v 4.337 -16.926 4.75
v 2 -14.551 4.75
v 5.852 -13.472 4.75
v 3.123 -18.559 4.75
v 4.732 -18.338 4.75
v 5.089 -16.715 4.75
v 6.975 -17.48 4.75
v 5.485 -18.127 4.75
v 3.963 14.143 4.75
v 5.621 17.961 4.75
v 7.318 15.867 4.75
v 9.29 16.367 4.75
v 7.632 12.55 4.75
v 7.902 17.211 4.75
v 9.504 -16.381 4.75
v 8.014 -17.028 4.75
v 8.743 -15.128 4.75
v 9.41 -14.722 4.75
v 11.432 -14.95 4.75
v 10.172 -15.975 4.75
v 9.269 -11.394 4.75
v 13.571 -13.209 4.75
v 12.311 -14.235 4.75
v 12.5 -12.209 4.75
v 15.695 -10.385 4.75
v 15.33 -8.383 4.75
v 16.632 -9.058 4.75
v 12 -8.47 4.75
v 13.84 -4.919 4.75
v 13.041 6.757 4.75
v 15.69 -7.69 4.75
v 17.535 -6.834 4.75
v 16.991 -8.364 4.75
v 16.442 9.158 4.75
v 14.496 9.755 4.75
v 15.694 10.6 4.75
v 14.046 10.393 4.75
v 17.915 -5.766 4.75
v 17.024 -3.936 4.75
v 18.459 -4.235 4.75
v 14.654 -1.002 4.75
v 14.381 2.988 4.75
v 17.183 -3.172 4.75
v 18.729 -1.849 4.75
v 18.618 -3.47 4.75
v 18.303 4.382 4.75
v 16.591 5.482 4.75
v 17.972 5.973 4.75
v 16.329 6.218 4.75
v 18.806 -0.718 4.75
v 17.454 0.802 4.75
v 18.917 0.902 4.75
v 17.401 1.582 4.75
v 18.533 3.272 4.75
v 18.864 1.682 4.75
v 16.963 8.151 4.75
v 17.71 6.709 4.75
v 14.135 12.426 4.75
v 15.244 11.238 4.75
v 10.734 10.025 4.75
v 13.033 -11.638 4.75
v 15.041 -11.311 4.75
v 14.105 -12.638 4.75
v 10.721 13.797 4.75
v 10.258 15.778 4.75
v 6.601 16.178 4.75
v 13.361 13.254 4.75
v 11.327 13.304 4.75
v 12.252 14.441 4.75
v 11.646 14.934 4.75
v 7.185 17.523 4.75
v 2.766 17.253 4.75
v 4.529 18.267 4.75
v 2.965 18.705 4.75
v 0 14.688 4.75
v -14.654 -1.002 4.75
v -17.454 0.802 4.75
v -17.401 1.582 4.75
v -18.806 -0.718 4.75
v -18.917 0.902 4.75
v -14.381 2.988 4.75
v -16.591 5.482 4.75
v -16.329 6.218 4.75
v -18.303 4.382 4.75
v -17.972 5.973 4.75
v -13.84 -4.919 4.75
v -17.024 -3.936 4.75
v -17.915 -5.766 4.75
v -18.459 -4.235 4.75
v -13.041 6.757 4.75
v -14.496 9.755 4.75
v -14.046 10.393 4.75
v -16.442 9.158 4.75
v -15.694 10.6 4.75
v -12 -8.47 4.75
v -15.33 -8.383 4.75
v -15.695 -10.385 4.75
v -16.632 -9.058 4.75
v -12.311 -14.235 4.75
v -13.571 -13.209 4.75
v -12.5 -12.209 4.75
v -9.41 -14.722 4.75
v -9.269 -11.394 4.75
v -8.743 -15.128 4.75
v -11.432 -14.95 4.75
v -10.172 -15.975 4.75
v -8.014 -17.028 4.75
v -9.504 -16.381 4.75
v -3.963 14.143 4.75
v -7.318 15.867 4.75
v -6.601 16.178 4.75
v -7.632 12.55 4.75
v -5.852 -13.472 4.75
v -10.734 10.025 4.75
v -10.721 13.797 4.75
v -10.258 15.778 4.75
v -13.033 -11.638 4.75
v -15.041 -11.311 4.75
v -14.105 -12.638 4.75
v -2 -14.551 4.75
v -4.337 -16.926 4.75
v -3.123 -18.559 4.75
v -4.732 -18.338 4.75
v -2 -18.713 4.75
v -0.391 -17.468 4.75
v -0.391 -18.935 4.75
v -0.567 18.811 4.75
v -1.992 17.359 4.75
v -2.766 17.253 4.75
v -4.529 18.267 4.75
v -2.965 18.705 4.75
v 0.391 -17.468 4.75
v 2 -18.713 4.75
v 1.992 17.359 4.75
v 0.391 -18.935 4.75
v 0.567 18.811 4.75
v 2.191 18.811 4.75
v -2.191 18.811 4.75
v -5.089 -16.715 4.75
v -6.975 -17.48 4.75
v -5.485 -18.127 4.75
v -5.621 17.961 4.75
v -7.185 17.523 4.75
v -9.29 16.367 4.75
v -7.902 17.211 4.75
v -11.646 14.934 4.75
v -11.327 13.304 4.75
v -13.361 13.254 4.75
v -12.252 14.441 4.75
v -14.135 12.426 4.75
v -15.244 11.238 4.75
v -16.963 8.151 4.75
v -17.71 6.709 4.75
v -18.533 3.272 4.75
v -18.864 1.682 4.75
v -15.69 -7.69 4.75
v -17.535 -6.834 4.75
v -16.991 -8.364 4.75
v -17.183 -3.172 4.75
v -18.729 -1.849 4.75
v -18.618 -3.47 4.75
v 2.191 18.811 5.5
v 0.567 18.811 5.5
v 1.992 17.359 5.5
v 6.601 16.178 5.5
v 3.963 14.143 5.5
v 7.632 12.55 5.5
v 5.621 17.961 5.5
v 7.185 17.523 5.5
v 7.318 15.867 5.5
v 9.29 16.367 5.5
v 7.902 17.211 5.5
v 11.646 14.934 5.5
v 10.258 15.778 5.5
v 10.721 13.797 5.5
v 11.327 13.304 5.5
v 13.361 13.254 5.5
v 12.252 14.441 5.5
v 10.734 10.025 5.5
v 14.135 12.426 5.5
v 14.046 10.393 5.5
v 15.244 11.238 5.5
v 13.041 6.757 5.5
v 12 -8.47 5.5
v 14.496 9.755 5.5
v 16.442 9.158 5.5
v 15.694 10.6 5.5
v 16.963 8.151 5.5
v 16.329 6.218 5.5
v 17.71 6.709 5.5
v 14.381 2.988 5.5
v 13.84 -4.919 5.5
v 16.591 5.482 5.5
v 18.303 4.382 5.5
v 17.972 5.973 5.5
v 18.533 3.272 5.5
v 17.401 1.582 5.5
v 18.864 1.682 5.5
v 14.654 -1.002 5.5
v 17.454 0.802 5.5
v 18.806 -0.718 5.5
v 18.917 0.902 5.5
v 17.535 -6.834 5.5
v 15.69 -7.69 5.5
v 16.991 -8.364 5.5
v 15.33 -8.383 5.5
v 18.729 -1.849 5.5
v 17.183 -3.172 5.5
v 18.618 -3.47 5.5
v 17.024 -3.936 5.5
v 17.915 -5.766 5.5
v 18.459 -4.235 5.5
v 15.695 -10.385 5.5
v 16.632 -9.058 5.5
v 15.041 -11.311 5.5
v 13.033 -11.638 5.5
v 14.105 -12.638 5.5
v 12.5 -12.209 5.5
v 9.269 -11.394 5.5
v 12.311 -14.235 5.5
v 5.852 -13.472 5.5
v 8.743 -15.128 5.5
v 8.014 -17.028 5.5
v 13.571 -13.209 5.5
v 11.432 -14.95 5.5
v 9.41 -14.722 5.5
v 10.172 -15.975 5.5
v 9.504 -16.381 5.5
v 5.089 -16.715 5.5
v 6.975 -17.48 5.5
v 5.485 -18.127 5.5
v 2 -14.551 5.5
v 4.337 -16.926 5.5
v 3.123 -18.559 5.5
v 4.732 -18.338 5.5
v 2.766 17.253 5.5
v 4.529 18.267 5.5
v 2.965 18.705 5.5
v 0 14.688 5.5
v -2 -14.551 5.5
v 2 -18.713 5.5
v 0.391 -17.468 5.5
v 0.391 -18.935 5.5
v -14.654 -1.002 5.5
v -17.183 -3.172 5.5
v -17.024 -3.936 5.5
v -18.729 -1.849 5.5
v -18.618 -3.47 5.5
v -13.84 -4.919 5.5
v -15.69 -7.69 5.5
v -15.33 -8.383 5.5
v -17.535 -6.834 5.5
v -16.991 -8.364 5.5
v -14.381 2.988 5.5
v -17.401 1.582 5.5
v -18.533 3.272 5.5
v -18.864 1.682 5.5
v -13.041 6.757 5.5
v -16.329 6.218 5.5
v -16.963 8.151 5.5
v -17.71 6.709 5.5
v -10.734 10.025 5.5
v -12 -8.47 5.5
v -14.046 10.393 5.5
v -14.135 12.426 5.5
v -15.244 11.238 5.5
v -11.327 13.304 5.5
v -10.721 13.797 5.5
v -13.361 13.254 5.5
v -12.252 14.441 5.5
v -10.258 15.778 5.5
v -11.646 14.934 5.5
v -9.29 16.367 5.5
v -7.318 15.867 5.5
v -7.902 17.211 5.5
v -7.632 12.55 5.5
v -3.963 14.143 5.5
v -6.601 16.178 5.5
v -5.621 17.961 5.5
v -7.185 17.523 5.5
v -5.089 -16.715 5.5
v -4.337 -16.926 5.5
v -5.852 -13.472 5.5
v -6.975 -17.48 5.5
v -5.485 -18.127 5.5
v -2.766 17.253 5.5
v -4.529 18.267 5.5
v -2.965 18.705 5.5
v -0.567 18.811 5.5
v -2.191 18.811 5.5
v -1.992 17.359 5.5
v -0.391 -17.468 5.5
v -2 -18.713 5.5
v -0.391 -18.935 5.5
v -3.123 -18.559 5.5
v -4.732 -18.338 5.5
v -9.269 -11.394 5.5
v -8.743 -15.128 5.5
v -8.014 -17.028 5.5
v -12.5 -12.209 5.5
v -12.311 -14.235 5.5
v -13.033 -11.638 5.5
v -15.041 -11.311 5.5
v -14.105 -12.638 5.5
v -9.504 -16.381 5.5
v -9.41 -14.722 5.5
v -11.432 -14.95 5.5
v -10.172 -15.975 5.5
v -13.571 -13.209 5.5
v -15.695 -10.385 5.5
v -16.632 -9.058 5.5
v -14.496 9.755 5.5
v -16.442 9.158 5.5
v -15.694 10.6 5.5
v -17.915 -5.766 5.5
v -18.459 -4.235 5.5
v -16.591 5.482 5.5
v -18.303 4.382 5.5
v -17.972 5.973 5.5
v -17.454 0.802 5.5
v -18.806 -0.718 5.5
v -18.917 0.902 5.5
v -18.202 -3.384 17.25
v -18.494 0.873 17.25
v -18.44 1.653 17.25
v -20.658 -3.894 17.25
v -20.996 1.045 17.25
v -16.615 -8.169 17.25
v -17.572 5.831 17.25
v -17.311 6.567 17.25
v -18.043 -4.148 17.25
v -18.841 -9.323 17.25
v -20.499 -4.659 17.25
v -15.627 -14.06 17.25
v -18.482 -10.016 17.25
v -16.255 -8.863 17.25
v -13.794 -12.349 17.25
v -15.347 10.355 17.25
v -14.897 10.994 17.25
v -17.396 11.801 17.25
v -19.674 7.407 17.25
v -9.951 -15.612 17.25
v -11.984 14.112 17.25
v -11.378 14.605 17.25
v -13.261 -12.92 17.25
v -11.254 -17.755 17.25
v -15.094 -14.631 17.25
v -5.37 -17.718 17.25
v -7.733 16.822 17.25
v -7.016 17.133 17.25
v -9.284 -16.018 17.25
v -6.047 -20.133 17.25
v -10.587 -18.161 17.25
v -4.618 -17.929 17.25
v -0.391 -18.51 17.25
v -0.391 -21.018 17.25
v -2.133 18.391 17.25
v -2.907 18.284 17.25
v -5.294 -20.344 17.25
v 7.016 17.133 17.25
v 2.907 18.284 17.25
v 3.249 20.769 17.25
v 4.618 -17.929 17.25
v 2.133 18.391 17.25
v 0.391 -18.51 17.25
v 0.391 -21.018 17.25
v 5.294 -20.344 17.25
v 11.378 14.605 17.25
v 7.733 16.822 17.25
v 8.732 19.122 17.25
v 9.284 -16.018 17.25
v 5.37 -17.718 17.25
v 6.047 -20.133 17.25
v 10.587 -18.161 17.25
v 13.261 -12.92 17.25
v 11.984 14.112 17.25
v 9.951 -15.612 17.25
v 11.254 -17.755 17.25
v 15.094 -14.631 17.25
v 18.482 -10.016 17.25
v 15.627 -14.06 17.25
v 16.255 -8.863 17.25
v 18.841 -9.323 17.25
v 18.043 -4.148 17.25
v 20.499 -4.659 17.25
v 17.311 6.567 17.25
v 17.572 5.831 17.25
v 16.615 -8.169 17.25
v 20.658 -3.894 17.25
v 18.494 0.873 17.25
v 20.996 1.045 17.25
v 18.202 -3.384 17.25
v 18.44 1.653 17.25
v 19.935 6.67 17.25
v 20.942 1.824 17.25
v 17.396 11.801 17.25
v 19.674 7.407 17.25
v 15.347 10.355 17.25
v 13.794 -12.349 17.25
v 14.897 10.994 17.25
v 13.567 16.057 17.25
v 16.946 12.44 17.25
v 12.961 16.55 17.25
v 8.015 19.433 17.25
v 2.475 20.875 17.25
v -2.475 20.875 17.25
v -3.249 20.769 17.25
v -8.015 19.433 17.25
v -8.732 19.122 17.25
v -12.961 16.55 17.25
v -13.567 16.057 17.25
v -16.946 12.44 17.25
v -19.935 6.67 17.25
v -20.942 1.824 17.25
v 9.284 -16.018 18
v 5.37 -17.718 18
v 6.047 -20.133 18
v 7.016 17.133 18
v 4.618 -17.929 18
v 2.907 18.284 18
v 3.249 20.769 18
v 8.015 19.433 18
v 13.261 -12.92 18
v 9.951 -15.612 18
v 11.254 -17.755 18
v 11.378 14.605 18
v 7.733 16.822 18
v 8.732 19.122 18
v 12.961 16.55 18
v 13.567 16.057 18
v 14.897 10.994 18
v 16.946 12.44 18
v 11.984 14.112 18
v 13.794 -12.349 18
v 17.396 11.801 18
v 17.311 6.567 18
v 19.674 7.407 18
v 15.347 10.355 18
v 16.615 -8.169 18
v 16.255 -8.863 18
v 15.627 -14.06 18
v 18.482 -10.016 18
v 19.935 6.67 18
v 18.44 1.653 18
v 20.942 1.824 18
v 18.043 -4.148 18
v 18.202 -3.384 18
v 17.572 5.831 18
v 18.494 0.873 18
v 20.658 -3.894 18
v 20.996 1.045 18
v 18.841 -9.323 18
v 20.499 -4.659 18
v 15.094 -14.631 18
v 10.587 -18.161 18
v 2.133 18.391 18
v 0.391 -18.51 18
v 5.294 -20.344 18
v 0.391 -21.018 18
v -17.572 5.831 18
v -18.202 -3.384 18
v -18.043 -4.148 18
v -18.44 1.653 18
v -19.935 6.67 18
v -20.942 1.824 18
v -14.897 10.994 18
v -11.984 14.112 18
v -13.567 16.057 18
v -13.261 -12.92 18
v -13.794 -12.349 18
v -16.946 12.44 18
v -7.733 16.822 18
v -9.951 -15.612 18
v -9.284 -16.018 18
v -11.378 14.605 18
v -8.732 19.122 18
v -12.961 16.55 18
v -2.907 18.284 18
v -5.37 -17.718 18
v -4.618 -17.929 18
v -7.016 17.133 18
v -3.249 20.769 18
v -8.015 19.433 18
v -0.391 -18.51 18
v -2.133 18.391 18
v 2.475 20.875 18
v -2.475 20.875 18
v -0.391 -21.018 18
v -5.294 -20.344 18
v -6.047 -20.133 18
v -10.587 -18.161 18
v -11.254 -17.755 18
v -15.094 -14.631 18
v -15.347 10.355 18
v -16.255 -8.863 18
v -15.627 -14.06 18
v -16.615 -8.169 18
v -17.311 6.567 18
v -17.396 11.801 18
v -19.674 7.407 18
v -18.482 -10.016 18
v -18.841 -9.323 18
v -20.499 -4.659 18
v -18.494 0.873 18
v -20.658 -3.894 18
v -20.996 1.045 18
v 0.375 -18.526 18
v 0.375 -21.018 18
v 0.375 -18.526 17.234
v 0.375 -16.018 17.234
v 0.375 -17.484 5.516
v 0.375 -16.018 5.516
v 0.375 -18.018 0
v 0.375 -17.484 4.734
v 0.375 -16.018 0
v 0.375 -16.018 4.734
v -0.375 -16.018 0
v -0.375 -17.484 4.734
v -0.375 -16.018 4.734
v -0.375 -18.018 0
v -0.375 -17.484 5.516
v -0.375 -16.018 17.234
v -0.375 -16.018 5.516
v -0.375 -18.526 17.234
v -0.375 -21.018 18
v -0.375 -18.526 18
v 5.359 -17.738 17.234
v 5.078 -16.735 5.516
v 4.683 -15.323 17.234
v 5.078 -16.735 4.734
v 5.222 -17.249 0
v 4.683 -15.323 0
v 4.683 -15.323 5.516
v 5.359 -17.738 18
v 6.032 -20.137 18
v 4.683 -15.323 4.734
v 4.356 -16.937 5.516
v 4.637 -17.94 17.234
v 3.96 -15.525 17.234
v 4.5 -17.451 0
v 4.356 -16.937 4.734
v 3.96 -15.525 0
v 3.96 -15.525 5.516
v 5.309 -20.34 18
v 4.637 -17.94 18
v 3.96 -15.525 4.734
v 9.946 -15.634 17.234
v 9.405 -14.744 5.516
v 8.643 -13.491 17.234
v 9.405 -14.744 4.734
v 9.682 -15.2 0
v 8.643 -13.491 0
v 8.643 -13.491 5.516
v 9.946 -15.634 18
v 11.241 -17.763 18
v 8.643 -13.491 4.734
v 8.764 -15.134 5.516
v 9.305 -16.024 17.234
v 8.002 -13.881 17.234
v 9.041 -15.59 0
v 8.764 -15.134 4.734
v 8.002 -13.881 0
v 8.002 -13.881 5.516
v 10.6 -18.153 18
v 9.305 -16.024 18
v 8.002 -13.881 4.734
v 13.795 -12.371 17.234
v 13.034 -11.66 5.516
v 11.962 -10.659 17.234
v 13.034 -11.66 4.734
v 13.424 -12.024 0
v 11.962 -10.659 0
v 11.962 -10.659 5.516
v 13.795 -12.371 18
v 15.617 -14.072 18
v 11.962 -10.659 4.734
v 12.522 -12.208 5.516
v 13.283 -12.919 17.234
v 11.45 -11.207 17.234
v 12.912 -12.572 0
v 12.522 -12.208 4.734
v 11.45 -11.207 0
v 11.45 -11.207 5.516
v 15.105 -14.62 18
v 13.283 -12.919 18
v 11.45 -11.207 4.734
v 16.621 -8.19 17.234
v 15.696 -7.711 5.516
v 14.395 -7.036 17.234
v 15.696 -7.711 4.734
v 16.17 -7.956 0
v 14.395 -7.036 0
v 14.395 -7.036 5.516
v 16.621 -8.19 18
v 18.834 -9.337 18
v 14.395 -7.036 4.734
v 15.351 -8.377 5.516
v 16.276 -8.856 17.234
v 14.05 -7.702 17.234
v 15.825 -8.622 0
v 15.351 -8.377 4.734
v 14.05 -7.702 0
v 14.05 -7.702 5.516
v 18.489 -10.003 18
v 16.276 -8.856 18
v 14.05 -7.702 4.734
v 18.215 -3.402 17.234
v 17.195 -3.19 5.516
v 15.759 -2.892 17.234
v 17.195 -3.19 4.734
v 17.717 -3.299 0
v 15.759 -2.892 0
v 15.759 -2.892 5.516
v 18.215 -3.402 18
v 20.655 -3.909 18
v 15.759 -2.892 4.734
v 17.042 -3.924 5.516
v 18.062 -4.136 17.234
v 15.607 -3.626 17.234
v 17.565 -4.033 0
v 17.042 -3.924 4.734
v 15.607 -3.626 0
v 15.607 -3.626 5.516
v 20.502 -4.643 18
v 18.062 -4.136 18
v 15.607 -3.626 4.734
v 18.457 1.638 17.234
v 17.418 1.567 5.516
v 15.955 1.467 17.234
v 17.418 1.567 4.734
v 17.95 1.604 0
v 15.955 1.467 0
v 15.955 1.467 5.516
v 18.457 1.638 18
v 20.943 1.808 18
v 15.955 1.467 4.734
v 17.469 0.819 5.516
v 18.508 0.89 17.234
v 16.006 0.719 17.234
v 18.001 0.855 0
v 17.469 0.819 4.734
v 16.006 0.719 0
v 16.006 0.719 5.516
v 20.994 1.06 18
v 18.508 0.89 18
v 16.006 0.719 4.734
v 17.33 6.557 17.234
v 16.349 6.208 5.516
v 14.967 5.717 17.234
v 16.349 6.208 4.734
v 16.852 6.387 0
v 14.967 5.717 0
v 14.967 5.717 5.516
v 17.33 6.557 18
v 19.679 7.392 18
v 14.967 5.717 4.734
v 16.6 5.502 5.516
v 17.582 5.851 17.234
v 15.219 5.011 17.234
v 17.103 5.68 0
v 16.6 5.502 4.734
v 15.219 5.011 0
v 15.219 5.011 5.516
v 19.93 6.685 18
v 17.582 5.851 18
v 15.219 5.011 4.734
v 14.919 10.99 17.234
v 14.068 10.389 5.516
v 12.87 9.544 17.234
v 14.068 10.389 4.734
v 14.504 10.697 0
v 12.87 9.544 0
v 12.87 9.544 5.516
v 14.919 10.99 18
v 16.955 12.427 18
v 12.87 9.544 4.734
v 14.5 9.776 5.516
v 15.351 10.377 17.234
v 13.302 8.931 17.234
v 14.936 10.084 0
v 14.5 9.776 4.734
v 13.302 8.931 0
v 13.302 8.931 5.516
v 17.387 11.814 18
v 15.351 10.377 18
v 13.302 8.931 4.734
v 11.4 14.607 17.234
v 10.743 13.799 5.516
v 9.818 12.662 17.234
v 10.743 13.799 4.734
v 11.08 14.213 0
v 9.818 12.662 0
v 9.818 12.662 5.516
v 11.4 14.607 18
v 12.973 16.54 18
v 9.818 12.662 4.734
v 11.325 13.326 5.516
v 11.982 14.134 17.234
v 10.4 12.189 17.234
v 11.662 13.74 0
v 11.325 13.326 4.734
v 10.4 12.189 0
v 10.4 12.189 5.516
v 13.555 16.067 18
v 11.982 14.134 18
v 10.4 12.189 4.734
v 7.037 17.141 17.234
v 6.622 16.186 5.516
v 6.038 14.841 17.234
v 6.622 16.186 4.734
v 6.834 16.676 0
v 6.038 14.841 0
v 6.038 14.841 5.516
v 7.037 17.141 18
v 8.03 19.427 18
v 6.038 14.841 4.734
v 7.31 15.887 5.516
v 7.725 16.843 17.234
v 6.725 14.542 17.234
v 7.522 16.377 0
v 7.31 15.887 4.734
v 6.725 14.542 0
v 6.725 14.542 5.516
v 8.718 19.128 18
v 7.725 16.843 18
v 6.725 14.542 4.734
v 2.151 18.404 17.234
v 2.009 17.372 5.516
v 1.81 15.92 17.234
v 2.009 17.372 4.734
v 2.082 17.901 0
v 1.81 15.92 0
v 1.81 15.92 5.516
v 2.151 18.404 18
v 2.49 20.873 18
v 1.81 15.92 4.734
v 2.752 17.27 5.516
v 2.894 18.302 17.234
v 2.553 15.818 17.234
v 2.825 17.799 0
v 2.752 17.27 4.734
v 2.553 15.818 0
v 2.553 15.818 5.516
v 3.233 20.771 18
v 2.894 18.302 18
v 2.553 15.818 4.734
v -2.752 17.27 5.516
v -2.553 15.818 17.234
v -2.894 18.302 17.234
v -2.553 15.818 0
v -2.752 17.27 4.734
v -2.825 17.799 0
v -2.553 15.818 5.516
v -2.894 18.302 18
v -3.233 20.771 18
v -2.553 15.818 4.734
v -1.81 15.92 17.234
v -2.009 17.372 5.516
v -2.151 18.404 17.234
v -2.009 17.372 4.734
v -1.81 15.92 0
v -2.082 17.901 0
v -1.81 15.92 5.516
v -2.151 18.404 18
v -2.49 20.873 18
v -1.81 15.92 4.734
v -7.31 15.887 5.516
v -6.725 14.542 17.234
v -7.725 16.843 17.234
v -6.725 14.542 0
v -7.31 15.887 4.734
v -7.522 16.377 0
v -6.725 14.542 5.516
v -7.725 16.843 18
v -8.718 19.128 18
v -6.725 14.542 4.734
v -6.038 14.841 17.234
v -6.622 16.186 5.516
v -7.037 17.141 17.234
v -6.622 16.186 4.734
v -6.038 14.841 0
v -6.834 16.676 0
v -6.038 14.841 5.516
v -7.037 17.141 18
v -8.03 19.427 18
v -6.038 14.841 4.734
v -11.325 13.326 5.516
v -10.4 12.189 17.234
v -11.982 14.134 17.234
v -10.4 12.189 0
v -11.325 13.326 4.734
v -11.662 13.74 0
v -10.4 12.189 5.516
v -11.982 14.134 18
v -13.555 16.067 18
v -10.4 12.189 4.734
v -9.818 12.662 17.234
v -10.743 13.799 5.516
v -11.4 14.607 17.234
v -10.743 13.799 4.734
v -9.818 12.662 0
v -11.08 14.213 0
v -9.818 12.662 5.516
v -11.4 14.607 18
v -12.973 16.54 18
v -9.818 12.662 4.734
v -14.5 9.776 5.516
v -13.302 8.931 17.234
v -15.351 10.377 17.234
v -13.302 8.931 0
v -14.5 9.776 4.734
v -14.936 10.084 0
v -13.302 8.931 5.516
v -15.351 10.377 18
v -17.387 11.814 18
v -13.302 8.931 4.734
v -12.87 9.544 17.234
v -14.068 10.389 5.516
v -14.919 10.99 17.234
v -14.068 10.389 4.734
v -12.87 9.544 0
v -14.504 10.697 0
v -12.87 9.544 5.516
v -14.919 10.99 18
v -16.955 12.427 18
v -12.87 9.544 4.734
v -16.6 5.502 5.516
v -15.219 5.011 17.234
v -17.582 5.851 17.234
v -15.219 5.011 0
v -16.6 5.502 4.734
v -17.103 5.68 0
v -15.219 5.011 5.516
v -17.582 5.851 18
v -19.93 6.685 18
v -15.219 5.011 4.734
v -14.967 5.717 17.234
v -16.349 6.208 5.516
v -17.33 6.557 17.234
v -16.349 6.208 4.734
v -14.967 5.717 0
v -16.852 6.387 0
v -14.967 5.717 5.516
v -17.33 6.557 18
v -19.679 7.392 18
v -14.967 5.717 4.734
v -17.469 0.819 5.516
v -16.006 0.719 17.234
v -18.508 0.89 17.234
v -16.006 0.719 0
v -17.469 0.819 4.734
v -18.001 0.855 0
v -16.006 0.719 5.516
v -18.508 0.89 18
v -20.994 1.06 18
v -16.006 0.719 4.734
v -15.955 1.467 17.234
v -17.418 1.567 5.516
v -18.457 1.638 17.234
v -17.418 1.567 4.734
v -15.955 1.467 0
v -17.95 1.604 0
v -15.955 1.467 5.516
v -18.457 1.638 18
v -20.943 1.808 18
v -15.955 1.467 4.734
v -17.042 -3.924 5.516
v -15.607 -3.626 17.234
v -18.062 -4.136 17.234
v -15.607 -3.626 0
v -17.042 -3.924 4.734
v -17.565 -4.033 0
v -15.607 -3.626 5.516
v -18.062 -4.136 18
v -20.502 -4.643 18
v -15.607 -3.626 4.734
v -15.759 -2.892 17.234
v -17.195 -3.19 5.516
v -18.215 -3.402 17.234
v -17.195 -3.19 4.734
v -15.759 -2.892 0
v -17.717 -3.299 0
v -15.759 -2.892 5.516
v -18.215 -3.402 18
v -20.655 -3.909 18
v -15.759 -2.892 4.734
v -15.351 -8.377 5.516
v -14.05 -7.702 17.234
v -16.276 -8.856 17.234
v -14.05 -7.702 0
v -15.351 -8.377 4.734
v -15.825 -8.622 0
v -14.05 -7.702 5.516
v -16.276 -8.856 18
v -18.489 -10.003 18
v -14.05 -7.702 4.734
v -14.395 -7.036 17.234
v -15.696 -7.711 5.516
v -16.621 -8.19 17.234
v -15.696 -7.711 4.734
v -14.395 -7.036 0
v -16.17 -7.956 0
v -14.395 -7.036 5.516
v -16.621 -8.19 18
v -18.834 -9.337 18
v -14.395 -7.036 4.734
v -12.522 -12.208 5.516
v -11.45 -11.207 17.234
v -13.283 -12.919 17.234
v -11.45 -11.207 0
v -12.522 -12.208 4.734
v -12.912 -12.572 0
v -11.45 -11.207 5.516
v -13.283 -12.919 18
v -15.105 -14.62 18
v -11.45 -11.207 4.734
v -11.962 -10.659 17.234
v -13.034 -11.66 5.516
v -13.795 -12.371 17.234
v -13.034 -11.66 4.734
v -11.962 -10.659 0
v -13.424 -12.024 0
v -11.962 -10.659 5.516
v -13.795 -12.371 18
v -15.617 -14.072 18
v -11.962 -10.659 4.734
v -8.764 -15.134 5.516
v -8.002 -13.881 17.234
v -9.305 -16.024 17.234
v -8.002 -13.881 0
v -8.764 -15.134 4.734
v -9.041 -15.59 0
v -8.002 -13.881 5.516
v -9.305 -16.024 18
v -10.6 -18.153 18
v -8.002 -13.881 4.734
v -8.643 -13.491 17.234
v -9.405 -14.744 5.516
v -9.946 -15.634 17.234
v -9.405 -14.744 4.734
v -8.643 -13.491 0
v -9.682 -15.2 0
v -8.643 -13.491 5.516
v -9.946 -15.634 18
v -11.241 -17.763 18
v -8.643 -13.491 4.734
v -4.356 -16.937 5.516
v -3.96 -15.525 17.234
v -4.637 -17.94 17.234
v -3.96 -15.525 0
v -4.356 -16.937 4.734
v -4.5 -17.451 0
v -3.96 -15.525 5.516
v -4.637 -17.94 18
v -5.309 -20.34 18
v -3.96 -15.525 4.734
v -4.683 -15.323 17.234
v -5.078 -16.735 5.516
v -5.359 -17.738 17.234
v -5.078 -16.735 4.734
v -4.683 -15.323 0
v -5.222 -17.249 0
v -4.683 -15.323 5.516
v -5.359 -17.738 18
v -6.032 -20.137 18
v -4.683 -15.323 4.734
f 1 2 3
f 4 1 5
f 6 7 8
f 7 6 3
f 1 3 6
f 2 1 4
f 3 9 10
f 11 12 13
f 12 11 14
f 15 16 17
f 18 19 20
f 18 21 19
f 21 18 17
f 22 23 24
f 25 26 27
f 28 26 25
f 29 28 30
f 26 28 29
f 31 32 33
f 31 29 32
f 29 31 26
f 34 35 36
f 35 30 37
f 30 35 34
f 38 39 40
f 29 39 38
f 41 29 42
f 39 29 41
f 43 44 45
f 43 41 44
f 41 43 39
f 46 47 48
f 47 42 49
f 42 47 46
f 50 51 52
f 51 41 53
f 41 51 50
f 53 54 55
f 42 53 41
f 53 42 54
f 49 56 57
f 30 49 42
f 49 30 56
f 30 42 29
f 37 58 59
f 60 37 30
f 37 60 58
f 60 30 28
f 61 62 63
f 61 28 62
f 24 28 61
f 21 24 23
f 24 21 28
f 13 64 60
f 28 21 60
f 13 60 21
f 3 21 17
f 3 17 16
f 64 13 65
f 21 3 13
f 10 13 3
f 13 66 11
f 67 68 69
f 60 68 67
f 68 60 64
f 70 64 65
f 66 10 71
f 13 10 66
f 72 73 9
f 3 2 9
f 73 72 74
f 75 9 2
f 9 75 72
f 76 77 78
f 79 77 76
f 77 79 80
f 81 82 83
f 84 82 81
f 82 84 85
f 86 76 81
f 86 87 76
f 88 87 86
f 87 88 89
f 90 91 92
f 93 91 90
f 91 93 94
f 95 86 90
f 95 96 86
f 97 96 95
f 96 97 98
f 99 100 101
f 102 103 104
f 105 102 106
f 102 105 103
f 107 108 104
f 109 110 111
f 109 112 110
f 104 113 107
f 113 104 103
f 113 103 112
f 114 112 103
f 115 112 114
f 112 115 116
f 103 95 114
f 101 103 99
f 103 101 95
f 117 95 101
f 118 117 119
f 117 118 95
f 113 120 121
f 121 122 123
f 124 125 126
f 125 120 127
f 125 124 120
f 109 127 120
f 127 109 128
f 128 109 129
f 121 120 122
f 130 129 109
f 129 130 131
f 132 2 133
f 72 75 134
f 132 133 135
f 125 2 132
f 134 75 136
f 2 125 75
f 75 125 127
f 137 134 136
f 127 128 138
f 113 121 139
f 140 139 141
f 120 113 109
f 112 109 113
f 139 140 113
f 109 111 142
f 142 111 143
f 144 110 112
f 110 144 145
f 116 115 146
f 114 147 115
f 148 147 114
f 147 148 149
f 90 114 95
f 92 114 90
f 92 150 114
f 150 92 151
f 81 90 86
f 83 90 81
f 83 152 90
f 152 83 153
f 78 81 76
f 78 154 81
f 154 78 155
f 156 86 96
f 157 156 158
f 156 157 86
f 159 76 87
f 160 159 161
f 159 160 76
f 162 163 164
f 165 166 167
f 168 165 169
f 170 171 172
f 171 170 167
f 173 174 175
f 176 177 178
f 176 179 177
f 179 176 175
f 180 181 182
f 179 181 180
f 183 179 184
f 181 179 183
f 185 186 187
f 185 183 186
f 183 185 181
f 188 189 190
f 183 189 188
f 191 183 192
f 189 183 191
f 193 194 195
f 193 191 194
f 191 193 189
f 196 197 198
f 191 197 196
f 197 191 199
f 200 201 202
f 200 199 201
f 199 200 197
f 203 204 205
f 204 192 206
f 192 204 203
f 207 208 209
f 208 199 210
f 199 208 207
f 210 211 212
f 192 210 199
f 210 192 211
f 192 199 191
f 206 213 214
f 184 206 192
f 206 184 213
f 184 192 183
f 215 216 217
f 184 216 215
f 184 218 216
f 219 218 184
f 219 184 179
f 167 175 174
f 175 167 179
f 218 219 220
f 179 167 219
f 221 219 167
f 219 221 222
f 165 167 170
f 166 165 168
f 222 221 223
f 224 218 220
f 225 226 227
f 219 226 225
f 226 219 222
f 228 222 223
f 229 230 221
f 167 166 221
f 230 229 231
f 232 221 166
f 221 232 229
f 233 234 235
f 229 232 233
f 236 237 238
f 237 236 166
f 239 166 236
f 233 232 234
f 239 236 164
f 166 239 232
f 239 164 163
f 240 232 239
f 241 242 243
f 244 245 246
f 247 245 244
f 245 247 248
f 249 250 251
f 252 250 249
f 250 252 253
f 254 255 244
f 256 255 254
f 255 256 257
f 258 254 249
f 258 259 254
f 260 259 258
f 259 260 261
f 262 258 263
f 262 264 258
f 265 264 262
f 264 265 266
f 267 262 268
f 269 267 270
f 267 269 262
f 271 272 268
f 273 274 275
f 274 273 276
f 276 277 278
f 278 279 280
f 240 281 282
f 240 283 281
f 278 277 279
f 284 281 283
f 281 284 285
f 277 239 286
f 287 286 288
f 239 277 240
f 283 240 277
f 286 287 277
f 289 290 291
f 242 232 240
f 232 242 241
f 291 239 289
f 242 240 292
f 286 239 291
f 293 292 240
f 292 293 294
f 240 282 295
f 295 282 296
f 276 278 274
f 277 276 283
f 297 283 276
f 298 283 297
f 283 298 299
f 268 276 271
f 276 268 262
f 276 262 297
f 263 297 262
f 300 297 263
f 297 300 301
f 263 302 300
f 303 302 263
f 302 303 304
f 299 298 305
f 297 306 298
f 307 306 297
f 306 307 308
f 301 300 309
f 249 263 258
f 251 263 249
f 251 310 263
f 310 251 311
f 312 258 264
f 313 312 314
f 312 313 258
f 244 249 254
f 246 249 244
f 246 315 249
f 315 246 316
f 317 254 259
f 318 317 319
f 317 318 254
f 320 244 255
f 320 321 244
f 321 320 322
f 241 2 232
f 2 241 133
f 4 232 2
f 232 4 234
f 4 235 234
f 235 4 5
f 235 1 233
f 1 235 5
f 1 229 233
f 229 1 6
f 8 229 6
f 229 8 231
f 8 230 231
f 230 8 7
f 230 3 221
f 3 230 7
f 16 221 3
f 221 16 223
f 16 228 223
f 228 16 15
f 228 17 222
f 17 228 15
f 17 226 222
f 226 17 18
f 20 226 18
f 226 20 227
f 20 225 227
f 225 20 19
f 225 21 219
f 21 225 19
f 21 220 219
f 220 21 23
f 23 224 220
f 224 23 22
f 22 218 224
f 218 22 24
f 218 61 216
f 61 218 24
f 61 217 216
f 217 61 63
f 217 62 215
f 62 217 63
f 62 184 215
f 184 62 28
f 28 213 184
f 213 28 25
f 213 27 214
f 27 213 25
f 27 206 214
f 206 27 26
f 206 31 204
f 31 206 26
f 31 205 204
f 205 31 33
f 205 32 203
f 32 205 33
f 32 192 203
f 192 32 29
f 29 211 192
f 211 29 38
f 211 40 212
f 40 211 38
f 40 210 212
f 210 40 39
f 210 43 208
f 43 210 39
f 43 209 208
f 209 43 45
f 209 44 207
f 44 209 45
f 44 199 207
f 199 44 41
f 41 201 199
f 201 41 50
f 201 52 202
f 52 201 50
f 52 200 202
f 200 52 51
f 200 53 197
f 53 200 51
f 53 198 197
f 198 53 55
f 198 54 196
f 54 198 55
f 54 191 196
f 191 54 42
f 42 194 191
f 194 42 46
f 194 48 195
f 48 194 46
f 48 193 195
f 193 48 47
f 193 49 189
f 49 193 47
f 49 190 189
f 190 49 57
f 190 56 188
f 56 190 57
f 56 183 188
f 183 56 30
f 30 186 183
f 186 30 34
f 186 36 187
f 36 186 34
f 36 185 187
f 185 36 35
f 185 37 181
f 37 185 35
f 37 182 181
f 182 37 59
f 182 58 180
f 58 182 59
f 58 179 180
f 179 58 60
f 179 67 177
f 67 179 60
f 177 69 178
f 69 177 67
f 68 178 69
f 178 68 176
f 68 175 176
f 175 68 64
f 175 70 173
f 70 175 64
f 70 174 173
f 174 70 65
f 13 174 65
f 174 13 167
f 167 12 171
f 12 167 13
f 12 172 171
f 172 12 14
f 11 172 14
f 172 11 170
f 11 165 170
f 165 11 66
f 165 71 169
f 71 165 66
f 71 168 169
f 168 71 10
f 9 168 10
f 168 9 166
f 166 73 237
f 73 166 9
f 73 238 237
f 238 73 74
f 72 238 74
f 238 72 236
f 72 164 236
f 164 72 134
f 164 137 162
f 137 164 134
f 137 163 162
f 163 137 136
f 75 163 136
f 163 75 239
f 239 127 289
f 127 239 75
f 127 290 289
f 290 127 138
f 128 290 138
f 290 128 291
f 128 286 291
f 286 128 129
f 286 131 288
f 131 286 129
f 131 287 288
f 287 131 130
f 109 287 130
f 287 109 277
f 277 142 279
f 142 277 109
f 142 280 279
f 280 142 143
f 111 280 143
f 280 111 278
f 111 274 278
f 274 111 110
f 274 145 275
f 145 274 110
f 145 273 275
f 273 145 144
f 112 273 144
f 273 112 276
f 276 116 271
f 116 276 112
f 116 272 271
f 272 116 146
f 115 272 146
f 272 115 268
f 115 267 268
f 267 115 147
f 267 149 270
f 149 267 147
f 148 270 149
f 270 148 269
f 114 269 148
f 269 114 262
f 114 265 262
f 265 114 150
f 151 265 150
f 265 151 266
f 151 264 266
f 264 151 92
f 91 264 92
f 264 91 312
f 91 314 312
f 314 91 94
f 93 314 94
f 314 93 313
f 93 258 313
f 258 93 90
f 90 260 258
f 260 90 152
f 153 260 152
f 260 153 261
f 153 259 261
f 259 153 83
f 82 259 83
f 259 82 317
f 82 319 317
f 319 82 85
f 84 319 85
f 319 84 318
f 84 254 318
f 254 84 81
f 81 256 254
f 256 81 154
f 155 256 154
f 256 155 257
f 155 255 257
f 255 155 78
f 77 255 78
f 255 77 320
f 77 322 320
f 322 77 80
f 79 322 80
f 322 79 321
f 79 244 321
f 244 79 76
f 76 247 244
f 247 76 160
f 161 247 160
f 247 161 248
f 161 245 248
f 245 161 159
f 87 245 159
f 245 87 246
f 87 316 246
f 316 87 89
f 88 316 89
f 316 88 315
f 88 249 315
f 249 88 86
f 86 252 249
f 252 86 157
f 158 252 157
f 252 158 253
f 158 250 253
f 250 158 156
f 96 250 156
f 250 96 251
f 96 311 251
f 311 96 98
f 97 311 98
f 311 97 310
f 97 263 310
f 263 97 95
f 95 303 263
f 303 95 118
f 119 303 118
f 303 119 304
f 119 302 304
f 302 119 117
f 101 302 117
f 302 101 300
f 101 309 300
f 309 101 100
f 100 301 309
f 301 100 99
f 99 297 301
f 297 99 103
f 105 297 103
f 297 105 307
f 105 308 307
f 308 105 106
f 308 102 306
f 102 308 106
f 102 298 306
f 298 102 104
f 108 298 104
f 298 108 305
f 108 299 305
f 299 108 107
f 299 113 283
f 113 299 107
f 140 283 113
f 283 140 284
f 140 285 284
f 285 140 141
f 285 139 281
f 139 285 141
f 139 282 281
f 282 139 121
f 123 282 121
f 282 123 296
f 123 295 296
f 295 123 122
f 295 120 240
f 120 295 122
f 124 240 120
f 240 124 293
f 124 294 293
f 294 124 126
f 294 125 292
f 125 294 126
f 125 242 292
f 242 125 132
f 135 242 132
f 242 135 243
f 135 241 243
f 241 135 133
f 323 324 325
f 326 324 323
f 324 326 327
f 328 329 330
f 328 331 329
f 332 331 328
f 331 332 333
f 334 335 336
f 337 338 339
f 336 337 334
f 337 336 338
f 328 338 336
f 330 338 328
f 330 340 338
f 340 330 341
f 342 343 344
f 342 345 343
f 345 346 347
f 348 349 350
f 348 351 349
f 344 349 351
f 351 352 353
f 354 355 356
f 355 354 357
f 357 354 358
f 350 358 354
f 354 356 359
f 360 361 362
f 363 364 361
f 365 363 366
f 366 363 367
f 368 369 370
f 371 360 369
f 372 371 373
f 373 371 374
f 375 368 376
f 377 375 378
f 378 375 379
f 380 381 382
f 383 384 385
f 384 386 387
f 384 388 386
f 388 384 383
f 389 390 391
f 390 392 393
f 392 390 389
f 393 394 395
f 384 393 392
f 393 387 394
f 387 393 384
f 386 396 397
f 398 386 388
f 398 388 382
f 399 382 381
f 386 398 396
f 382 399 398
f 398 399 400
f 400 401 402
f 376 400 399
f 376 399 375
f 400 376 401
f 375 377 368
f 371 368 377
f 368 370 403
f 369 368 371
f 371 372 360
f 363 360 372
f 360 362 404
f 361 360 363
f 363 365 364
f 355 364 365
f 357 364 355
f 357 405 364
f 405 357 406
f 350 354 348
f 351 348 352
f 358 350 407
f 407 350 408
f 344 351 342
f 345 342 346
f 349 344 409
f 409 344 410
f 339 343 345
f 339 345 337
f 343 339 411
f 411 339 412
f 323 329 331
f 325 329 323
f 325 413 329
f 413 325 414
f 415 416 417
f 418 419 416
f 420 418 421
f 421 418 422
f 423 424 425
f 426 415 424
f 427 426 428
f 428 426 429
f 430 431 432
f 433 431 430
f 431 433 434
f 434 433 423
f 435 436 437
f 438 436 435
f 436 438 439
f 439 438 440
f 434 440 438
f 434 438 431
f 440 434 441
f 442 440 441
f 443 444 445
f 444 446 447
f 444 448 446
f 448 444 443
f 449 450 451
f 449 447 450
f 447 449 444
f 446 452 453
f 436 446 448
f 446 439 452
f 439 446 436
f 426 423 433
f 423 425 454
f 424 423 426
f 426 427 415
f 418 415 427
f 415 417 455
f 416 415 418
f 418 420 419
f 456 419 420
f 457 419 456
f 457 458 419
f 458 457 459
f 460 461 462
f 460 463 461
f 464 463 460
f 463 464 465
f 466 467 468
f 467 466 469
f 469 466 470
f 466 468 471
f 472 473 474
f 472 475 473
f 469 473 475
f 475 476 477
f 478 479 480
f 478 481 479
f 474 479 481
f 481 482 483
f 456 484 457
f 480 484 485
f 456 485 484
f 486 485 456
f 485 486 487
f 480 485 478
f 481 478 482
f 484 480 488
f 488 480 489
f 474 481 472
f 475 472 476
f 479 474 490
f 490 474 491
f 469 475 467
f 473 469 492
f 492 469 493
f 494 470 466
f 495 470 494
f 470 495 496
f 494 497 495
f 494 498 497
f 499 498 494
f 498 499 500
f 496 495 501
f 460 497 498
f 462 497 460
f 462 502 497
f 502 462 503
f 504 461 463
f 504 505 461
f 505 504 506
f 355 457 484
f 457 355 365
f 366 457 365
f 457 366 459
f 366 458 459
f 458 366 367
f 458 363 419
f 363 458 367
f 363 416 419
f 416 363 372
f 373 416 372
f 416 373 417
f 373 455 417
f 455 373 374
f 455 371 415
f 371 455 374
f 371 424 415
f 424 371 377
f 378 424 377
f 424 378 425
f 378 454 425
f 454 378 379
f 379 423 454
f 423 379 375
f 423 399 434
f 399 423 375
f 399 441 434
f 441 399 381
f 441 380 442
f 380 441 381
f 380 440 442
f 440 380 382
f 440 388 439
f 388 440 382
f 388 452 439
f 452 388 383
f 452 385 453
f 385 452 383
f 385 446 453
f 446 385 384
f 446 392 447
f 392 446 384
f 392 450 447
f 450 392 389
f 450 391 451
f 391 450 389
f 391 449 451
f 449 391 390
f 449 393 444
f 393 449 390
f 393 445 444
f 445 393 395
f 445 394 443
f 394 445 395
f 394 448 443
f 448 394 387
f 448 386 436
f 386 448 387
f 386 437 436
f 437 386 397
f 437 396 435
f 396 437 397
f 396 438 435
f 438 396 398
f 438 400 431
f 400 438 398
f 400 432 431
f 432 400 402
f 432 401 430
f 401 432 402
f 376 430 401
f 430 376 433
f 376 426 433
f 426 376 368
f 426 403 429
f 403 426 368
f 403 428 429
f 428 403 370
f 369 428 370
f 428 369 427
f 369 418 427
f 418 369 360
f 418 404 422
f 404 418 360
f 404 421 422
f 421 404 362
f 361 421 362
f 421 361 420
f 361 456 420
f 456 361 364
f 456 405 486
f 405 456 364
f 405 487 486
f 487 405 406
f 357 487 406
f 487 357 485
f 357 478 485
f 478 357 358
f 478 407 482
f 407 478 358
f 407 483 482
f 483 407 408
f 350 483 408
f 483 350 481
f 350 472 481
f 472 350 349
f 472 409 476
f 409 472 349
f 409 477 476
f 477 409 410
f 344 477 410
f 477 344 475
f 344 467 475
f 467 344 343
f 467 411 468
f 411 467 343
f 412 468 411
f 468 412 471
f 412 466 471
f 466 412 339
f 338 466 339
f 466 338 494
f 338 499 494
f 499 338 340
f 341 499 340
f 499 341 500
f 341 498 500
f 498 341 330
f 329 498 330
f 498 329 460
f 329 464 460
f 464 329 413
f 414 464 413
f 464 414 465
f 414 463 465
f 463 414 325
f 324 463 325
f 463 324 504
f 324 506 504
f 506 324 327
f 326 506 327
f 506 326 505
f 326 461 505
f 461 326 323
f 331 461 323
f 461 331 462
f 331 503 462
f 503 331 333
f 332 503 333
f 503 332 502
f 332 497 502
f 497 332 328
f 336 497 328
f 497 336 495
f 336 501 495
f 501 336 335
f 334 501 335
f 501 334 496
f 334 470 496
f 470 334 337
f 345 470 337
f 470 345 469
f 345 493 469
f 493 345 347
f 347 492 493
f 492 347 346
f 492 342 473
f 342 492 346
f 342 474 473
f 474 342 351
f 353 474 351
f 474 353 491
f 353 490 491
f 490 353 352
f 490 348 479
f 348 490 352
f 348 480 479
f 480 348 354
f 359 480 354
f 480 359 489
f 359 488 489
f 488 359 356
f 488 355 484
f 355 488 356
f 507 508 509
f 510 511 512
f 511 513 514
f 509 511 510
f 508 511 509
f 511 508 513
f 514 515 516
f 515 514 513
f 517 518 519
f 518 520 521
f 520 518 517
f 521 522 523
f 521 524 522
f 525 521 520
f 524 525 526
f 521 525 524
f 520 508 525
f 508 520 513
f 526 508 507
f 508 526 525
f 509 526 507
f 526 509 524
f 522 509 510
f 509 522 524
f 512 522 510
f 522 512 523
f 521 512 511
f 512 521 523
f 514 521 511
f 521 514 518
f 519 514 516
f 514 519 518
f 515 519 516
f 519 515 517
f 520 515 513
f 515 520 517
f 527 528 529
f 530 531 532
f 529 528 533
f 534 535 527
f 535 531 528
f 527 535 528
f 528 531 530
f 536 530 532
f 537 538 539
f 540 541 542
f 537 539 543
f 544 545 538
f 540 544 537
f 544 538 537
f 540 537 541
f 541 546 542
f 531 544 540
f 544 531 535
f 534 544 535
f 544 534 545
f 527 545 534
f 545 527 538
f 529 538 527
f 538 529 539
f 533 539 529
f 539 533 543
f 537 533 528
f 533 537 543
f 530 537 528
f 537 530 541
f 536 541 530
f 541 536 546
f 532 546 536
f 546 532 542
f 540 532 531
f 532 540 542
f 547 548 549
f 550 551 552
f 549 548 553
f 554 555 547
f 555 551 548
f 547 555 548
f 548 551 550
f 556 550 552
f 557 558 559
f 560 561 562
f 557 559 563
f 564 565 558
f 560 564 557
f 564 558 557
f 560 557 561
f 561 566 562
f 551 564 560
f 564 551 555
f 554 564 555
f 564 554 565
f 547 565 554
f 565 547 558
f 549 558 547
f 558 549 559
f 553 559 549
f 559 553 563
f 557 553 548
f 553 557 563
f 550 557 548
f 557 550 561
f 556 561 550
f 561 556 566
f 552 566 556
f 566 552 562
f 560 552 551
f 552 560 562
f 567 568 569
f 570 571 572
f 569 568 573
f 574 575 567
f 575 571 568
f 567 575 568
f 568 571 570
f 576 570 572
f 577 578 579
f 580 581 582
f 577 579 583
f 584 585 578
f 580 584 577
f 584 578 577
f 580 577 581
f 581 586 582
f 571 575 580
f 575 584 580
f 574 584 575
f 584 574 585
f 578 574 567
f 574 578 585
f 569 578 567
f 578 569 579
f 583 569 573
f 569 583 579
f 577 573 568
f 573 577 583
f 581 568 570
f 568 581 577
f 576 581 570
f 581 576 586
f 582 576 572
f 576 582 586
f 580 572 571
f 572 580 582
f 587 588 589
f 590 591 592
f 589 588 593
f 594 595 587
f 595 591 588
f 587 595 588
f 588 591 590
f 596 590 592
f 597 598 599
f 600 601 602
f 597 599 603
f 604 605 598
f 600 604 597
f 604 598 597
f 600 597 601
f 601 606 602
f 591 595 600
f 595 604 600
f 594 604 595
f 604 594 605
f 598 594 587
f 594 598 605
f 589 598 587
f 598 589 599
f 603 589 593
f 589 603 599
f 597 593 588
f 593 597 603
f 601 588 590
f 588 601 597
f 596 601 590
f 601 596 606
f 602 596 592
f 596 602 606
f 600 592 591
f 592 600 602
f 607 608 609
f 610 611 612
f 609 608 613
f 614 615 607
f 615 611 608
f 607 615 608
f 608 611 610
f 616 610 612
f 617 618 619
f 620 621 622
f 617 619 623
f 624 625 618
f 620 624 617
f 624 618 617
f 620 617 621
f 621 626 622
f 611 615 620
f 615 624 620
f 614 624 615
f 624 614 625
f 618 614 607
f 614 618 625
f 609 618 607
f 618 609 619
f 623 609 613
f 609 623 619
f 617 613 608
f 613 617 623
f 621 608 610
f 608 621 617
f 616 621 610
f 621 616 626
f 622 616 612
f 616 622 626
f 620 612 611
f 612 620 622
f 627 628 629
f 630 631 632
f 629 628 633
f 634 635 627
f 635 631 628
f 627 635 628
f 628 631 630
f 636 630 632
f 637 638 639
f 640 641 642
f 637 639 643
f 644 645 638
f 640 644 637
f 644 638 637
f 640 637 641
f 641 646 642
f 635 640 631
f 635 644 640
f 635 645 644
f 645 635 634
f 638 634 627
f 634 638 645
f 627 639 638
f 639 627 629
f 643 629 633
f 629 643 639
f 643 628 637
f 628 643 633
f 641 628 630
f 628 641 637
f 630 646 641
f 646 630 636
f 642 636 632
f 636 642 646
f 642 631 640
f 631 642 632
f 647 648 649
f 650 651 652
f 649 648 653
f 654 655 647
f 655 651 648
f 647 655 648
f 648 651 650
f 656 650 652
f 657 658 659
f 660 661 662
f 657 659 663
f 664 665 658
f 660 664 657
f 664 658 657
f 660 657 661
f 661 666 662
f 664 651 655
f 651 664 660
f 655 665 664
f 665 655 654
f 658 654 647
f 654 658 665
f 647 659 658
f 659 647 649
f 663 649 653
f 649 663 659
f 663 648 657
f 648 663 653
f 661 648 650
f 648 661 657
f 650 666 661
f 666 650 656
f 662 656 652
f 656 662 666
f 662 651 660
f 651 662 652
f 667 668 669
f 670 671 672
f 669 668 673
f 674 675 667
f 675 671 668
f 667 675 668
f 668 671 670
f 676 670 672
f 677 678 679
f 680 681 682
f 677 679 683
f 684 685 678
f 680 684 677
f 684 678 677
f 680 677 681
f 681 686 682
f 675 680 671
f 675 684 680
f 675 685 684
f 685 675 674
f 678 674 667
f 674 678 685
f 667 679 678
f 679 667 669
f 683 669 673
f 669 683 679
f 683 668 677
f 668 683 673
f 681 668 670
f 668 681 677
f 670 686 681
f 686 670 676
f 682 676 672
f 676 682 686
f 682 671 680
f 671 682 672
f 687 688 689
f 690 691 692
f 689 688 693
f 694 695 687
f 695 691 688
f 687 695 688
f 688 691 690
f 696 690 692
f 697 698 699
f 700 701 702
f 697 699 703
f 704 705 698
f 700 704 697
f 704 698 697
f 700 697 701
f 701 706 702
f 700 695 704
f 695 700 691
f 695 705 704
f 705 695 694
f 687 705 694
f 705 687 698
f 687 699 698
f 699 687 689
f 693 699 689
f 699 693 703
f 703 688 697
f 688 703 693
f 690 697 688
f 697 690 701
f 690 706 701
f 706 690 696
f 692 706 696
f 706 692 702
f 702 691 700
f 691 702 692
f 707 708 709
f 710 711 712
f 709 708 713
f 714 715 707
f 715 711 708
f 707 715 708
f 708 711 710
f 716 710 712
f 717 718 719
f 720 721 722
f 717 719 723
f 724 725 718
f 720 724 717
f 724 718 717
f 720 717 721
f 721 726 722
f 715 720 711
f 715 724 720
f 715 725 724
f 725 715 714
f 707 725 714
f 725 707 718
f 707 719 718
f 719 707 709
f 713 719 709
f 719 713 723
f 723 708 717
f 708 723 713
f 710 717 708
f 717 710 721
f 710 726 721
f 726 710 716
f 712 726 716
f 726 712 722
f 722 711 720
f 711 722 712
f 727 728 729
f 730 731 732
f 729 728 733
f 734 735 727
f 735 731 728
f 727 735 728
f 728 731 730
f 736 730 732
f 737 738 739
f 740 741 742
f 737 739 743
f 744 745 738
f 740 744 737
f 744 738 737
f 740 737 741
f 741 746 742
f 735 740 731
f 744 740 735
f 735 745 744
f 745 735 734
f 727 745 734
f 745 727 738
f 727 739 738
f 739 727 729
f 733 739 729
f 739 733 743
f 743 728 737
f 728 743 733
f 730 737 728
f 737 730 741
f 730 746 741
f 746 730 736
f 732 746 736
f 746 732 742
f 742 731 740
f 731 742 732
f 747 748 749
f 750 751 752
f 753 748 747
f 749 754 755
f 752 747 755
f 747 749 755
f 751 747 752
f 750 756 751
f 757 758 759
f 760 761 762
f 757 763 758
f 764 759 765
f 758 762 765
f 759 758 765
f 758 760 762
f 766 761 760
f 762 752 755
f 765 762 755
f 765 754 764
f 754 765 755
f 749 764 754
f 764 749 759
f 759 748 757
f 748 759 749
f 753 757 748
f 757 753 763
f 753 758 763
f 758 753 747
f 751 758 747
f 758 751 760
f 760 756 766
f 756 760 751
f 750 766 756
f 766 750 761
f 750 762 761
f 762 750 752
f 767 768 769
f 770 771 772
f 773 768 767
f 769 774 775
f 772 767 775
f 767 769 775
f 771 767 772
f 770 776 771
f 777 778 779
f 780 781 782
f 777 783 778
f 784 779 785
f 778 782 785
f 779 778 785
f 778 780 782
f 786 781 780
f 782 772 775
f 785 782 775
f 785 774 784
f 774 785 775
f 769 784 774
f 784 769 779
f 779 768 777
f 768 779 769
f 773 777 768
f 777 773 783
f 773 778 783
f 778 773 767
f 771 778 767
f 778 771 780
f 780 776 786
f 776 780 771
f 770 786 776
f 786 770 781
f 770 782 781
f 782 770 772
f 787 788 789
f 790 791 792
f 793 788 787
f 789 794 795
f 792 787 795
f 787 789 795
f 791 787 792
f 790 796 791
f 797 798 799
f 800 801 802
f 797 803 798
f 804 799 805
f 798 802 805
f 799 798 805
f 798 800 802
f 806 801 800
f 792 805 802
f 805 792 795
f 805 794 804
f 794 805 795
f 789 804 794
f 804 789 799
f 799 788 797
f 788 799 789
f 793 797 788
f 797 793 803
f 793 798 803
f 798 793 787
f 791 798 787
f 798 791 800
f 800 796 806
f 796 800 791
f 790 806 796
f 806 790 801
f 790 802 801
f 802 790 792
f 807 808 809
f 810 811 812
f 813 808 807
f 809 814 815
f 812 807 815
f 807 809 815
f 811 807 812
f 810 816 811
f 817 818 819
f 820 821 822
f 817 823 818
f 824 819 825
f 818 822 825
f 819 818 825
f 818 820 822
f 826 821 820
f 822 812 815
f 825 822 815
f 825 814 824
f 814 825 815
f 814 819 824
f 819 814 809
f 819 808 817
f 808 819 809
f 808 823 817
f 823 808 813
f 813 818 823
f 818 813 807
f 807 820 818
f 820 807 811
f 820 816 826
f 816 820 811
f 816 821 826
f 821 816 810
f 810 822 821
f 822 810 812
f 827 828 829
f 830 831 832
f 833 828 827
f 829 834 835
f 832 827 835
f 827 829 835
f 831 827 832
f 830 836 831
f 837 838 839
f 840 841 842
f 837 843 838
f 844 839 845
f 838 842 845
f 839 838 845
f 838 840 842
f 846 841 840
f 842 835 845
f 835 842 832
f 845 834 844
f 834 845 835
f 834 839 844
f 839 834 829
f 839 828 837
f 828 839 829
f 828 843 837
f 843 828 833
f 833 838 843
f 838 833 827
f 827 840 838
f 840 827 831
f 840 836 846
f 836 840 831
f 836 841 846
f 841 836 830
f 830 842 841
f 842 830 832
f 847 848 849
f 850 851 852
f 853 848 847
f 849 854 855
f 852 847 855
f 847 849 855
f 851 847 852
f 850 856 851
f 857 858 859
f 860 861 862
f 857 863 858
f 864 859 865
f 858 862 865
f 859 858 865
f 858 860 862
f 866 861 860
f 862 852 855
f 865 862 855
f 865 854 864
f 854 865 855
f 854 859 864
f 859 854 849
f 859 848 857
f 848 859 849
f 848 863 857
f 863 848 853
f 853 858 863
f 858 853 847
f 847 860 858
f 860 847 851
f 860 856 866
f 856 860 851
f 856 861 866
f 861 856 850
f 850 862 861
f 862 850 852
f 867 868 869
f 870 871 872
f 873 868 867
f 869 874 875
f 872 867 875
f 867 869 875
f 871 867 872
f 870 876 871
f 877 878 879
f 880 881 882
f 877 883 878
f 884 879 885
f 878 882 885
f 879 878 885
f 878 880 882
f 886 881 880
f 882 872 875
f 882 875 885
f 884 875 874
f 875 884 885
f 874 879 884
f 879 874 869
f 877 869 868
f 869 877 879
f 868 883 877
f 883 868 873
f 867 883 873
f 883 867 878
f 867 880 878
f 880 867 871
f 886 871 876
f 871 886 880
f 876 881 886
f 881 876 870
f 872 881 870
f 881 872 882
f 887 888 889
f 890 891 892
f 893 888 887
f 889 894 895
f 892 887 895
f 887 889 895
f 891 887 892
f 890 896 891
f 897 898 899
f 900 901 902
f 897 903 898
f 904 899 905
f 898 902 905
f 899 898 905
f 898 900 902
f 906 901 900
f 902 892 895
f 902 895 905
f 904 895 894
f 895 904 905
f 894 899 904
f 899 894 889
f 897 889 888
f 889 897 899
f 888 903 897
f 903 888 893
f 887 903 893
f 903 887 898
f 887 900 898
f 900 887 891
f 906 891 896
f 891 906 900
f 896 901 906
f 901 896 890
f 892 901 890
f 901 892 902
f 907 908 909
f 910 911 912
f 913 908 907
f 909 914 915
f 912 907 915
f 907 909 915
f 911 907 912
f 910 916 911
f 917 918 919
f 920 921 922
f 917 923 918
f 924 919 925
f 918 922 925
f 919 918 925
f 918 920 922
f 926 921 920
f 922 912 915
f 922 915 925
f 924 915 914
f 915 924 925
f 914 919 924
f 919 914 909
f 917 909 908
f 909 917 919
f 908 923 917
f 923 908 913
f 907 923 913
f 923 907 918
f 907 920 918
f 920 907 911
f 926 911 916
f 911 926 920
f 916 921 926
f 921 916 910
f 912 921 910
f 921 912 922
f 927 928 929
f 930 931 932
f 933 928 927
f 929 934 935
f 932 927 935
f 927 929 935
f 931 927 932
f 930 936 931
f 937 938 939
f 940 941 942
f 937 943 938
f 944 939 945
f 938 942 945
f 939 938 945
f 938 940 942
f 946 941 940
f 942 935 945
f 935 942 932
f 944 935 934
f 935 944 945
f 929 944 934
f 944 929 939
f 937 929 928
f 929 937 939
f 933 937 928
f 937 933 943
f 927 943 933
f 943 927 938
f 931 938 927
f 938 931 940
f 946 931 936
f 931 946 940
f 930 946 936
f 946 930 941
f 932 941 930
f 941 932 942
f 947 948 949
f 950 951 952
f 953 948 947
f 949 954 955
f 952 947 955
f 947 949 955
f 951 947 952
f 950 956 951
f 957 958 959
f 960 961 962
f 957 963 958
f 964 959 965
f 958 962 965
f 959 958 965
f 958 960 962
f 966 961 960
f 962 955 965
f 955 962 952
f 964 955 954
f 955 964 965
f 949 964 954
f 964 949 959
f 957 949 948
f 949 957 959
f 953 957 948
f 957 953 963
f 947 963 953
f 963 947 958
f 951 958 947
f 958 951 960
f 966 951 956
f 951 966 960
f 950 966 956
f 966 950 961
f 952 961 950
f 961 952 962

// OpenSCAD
// file: ../src/functions.scad
module shelf(type, diameter,leg_width) {
    if (type == 0)
    round_shelf(diameter, leg_width);
    if (type == 1)
    square_shelf(diameter, leg_width);
    if (type == 2)
    square_shelf_leg_supports(diameter, leg_width);
}

module round_shelf(diameter,leg_width) {
    difference() {
        circle(d=diameter);
        leg_slots(diameter, leg_width);
    }
}

module square_shelf(diameter,leg_width) {
    difference() {
        hull() {
            leg_slots(diameter, leg_width);
        }
        leg_slots(diameter, leg_width);
    }
}

module square_shelf_leg_supports(diameter,leg_width) {
    intersection() {
        square_shelf(diameter, leg_width);
        for(i=[0:leg_count-1]) {
            rotate(i*360/leg_count)
            translate([-leg_support/2,-diameter/2])
            square([leg_support,diameter/2]);
        }
    }
}


module leg_slots(diameter, leg_width) {
    for(i=[0:leg_count-1]) {
        rotate(i*360/leg_count)
        translate([-leg_thick/2-gap,-diameter/2])
        square([leg_thick+gapp,leg_width]);
    }
}

module shelf_number(i) {
        shelf(shelves[i], tan(leg_angle)*((top_height-leg_height)/(shelf_count-1)*i+leg_height)*2+bottom,(tan(leg_angle)*((top_height-leg_height)/(shelf_count-1)*i+leg_height)+min_leg)/2+gap/2);
}

module assemble_shelves() {
    for(i=[0:shelf_count-1]) {
        translate([0,0,(top_height-leg_height)/(shelf_count-1)*i+leg_height-plywood])
        linear_extrude(height=plywood)
        shelf_number(i);
    }
}

module assemble_legs() {
    for(i=[0:leg_count-1]) {
        rotate(i*360/leg_count)
        translate([-leg_thick/2-plywood/2,0,0])
        for(l=[1:leg_layers]) {
            translate([plywood*l,0,0])
            leg_3d();
        }
    }
}

//shelf(bottom,min_leg);

module leg() {
    difference() {
        square([min_leg+(top-bottom)/2,top_height]);
        translate([min_leg,0])
        rotate(-leg_angle)
        square([min_leg+(top-bottom),top_height*2]);
        for(i=[0:shelf_count-1]) {
            translate([0,(top_height-leg_height)/(shelf_count-1)*i+leg_height-plywood-gap])
            square([(tan(leg_angle)*((top_height-leg_height)/(shelf_count-1)*i+leg_height)+min_leg)/2+gap/2,plywood+gapp]);
        }
            
    }
}

module leg_3d() {
    translate([0,-bottom/2+min_leg,0])
    rotate([90,0,-90])
    translate([0,0,-plywood/2])
    color("lime")
    linear_extrude(height=plywood)
    leg();
}

module assemble() {
    assemble_shelves();
    assemble_legs();
}

module plate() {
    for(i=[0:leg_count/2-1]) {
        translate([i*((top-bottom)/2+min_leg*2+tree*2),0]) {
            leg();
            translate([min_leg+(top-bottom)/2+tree+min_leg,top_height])
            rotate(180)
            leg();
        }
    }
    if(leg_count%2 != 0) {
            translate([floor(leg_count/2)*((top-bottom)/2+min_leg*2+tree*2),0])
            leg();
    }
    translate([0,-top/2-tree])
    for(i=[0:shelf_count-1]) {
        //too much math, I can drag in inkscape
        translate([top*i,0])
        shelf_number(i);
    }
}
// main file
include <../src/functions.scad>;

square_top=30;
shelves = [2, 1];
// 0 = round
// 1 = square
// 2 = leg_supports (square)
shelf_count = len(shelves);
leg_layers=1;
leg_count = 23 + floor(sin($t*180+180)*20);
leg_height = 5.5; // bottom shelf
top_height = 18; //top to ground
min_leg = 2; //smallest size a leg can be
plywood = 0.75;
gap = 1/64;
gapp = gap*2;
pad = 0.1;
padd = pad*2;
leg_thick=plywood*leg_layers;

leg_support=4;

tree=2;

top = sqrt(2*pow((square_top/2),2))*2-leg_thick/2-gap; //diameter
bottom = top-6; //diameter
leg_angle = atan((top-bottom)/2/top_height);
echo("top is", top);

$fn=120;


// RENDER gif
module demo() {
    assemble();
}

demo();
